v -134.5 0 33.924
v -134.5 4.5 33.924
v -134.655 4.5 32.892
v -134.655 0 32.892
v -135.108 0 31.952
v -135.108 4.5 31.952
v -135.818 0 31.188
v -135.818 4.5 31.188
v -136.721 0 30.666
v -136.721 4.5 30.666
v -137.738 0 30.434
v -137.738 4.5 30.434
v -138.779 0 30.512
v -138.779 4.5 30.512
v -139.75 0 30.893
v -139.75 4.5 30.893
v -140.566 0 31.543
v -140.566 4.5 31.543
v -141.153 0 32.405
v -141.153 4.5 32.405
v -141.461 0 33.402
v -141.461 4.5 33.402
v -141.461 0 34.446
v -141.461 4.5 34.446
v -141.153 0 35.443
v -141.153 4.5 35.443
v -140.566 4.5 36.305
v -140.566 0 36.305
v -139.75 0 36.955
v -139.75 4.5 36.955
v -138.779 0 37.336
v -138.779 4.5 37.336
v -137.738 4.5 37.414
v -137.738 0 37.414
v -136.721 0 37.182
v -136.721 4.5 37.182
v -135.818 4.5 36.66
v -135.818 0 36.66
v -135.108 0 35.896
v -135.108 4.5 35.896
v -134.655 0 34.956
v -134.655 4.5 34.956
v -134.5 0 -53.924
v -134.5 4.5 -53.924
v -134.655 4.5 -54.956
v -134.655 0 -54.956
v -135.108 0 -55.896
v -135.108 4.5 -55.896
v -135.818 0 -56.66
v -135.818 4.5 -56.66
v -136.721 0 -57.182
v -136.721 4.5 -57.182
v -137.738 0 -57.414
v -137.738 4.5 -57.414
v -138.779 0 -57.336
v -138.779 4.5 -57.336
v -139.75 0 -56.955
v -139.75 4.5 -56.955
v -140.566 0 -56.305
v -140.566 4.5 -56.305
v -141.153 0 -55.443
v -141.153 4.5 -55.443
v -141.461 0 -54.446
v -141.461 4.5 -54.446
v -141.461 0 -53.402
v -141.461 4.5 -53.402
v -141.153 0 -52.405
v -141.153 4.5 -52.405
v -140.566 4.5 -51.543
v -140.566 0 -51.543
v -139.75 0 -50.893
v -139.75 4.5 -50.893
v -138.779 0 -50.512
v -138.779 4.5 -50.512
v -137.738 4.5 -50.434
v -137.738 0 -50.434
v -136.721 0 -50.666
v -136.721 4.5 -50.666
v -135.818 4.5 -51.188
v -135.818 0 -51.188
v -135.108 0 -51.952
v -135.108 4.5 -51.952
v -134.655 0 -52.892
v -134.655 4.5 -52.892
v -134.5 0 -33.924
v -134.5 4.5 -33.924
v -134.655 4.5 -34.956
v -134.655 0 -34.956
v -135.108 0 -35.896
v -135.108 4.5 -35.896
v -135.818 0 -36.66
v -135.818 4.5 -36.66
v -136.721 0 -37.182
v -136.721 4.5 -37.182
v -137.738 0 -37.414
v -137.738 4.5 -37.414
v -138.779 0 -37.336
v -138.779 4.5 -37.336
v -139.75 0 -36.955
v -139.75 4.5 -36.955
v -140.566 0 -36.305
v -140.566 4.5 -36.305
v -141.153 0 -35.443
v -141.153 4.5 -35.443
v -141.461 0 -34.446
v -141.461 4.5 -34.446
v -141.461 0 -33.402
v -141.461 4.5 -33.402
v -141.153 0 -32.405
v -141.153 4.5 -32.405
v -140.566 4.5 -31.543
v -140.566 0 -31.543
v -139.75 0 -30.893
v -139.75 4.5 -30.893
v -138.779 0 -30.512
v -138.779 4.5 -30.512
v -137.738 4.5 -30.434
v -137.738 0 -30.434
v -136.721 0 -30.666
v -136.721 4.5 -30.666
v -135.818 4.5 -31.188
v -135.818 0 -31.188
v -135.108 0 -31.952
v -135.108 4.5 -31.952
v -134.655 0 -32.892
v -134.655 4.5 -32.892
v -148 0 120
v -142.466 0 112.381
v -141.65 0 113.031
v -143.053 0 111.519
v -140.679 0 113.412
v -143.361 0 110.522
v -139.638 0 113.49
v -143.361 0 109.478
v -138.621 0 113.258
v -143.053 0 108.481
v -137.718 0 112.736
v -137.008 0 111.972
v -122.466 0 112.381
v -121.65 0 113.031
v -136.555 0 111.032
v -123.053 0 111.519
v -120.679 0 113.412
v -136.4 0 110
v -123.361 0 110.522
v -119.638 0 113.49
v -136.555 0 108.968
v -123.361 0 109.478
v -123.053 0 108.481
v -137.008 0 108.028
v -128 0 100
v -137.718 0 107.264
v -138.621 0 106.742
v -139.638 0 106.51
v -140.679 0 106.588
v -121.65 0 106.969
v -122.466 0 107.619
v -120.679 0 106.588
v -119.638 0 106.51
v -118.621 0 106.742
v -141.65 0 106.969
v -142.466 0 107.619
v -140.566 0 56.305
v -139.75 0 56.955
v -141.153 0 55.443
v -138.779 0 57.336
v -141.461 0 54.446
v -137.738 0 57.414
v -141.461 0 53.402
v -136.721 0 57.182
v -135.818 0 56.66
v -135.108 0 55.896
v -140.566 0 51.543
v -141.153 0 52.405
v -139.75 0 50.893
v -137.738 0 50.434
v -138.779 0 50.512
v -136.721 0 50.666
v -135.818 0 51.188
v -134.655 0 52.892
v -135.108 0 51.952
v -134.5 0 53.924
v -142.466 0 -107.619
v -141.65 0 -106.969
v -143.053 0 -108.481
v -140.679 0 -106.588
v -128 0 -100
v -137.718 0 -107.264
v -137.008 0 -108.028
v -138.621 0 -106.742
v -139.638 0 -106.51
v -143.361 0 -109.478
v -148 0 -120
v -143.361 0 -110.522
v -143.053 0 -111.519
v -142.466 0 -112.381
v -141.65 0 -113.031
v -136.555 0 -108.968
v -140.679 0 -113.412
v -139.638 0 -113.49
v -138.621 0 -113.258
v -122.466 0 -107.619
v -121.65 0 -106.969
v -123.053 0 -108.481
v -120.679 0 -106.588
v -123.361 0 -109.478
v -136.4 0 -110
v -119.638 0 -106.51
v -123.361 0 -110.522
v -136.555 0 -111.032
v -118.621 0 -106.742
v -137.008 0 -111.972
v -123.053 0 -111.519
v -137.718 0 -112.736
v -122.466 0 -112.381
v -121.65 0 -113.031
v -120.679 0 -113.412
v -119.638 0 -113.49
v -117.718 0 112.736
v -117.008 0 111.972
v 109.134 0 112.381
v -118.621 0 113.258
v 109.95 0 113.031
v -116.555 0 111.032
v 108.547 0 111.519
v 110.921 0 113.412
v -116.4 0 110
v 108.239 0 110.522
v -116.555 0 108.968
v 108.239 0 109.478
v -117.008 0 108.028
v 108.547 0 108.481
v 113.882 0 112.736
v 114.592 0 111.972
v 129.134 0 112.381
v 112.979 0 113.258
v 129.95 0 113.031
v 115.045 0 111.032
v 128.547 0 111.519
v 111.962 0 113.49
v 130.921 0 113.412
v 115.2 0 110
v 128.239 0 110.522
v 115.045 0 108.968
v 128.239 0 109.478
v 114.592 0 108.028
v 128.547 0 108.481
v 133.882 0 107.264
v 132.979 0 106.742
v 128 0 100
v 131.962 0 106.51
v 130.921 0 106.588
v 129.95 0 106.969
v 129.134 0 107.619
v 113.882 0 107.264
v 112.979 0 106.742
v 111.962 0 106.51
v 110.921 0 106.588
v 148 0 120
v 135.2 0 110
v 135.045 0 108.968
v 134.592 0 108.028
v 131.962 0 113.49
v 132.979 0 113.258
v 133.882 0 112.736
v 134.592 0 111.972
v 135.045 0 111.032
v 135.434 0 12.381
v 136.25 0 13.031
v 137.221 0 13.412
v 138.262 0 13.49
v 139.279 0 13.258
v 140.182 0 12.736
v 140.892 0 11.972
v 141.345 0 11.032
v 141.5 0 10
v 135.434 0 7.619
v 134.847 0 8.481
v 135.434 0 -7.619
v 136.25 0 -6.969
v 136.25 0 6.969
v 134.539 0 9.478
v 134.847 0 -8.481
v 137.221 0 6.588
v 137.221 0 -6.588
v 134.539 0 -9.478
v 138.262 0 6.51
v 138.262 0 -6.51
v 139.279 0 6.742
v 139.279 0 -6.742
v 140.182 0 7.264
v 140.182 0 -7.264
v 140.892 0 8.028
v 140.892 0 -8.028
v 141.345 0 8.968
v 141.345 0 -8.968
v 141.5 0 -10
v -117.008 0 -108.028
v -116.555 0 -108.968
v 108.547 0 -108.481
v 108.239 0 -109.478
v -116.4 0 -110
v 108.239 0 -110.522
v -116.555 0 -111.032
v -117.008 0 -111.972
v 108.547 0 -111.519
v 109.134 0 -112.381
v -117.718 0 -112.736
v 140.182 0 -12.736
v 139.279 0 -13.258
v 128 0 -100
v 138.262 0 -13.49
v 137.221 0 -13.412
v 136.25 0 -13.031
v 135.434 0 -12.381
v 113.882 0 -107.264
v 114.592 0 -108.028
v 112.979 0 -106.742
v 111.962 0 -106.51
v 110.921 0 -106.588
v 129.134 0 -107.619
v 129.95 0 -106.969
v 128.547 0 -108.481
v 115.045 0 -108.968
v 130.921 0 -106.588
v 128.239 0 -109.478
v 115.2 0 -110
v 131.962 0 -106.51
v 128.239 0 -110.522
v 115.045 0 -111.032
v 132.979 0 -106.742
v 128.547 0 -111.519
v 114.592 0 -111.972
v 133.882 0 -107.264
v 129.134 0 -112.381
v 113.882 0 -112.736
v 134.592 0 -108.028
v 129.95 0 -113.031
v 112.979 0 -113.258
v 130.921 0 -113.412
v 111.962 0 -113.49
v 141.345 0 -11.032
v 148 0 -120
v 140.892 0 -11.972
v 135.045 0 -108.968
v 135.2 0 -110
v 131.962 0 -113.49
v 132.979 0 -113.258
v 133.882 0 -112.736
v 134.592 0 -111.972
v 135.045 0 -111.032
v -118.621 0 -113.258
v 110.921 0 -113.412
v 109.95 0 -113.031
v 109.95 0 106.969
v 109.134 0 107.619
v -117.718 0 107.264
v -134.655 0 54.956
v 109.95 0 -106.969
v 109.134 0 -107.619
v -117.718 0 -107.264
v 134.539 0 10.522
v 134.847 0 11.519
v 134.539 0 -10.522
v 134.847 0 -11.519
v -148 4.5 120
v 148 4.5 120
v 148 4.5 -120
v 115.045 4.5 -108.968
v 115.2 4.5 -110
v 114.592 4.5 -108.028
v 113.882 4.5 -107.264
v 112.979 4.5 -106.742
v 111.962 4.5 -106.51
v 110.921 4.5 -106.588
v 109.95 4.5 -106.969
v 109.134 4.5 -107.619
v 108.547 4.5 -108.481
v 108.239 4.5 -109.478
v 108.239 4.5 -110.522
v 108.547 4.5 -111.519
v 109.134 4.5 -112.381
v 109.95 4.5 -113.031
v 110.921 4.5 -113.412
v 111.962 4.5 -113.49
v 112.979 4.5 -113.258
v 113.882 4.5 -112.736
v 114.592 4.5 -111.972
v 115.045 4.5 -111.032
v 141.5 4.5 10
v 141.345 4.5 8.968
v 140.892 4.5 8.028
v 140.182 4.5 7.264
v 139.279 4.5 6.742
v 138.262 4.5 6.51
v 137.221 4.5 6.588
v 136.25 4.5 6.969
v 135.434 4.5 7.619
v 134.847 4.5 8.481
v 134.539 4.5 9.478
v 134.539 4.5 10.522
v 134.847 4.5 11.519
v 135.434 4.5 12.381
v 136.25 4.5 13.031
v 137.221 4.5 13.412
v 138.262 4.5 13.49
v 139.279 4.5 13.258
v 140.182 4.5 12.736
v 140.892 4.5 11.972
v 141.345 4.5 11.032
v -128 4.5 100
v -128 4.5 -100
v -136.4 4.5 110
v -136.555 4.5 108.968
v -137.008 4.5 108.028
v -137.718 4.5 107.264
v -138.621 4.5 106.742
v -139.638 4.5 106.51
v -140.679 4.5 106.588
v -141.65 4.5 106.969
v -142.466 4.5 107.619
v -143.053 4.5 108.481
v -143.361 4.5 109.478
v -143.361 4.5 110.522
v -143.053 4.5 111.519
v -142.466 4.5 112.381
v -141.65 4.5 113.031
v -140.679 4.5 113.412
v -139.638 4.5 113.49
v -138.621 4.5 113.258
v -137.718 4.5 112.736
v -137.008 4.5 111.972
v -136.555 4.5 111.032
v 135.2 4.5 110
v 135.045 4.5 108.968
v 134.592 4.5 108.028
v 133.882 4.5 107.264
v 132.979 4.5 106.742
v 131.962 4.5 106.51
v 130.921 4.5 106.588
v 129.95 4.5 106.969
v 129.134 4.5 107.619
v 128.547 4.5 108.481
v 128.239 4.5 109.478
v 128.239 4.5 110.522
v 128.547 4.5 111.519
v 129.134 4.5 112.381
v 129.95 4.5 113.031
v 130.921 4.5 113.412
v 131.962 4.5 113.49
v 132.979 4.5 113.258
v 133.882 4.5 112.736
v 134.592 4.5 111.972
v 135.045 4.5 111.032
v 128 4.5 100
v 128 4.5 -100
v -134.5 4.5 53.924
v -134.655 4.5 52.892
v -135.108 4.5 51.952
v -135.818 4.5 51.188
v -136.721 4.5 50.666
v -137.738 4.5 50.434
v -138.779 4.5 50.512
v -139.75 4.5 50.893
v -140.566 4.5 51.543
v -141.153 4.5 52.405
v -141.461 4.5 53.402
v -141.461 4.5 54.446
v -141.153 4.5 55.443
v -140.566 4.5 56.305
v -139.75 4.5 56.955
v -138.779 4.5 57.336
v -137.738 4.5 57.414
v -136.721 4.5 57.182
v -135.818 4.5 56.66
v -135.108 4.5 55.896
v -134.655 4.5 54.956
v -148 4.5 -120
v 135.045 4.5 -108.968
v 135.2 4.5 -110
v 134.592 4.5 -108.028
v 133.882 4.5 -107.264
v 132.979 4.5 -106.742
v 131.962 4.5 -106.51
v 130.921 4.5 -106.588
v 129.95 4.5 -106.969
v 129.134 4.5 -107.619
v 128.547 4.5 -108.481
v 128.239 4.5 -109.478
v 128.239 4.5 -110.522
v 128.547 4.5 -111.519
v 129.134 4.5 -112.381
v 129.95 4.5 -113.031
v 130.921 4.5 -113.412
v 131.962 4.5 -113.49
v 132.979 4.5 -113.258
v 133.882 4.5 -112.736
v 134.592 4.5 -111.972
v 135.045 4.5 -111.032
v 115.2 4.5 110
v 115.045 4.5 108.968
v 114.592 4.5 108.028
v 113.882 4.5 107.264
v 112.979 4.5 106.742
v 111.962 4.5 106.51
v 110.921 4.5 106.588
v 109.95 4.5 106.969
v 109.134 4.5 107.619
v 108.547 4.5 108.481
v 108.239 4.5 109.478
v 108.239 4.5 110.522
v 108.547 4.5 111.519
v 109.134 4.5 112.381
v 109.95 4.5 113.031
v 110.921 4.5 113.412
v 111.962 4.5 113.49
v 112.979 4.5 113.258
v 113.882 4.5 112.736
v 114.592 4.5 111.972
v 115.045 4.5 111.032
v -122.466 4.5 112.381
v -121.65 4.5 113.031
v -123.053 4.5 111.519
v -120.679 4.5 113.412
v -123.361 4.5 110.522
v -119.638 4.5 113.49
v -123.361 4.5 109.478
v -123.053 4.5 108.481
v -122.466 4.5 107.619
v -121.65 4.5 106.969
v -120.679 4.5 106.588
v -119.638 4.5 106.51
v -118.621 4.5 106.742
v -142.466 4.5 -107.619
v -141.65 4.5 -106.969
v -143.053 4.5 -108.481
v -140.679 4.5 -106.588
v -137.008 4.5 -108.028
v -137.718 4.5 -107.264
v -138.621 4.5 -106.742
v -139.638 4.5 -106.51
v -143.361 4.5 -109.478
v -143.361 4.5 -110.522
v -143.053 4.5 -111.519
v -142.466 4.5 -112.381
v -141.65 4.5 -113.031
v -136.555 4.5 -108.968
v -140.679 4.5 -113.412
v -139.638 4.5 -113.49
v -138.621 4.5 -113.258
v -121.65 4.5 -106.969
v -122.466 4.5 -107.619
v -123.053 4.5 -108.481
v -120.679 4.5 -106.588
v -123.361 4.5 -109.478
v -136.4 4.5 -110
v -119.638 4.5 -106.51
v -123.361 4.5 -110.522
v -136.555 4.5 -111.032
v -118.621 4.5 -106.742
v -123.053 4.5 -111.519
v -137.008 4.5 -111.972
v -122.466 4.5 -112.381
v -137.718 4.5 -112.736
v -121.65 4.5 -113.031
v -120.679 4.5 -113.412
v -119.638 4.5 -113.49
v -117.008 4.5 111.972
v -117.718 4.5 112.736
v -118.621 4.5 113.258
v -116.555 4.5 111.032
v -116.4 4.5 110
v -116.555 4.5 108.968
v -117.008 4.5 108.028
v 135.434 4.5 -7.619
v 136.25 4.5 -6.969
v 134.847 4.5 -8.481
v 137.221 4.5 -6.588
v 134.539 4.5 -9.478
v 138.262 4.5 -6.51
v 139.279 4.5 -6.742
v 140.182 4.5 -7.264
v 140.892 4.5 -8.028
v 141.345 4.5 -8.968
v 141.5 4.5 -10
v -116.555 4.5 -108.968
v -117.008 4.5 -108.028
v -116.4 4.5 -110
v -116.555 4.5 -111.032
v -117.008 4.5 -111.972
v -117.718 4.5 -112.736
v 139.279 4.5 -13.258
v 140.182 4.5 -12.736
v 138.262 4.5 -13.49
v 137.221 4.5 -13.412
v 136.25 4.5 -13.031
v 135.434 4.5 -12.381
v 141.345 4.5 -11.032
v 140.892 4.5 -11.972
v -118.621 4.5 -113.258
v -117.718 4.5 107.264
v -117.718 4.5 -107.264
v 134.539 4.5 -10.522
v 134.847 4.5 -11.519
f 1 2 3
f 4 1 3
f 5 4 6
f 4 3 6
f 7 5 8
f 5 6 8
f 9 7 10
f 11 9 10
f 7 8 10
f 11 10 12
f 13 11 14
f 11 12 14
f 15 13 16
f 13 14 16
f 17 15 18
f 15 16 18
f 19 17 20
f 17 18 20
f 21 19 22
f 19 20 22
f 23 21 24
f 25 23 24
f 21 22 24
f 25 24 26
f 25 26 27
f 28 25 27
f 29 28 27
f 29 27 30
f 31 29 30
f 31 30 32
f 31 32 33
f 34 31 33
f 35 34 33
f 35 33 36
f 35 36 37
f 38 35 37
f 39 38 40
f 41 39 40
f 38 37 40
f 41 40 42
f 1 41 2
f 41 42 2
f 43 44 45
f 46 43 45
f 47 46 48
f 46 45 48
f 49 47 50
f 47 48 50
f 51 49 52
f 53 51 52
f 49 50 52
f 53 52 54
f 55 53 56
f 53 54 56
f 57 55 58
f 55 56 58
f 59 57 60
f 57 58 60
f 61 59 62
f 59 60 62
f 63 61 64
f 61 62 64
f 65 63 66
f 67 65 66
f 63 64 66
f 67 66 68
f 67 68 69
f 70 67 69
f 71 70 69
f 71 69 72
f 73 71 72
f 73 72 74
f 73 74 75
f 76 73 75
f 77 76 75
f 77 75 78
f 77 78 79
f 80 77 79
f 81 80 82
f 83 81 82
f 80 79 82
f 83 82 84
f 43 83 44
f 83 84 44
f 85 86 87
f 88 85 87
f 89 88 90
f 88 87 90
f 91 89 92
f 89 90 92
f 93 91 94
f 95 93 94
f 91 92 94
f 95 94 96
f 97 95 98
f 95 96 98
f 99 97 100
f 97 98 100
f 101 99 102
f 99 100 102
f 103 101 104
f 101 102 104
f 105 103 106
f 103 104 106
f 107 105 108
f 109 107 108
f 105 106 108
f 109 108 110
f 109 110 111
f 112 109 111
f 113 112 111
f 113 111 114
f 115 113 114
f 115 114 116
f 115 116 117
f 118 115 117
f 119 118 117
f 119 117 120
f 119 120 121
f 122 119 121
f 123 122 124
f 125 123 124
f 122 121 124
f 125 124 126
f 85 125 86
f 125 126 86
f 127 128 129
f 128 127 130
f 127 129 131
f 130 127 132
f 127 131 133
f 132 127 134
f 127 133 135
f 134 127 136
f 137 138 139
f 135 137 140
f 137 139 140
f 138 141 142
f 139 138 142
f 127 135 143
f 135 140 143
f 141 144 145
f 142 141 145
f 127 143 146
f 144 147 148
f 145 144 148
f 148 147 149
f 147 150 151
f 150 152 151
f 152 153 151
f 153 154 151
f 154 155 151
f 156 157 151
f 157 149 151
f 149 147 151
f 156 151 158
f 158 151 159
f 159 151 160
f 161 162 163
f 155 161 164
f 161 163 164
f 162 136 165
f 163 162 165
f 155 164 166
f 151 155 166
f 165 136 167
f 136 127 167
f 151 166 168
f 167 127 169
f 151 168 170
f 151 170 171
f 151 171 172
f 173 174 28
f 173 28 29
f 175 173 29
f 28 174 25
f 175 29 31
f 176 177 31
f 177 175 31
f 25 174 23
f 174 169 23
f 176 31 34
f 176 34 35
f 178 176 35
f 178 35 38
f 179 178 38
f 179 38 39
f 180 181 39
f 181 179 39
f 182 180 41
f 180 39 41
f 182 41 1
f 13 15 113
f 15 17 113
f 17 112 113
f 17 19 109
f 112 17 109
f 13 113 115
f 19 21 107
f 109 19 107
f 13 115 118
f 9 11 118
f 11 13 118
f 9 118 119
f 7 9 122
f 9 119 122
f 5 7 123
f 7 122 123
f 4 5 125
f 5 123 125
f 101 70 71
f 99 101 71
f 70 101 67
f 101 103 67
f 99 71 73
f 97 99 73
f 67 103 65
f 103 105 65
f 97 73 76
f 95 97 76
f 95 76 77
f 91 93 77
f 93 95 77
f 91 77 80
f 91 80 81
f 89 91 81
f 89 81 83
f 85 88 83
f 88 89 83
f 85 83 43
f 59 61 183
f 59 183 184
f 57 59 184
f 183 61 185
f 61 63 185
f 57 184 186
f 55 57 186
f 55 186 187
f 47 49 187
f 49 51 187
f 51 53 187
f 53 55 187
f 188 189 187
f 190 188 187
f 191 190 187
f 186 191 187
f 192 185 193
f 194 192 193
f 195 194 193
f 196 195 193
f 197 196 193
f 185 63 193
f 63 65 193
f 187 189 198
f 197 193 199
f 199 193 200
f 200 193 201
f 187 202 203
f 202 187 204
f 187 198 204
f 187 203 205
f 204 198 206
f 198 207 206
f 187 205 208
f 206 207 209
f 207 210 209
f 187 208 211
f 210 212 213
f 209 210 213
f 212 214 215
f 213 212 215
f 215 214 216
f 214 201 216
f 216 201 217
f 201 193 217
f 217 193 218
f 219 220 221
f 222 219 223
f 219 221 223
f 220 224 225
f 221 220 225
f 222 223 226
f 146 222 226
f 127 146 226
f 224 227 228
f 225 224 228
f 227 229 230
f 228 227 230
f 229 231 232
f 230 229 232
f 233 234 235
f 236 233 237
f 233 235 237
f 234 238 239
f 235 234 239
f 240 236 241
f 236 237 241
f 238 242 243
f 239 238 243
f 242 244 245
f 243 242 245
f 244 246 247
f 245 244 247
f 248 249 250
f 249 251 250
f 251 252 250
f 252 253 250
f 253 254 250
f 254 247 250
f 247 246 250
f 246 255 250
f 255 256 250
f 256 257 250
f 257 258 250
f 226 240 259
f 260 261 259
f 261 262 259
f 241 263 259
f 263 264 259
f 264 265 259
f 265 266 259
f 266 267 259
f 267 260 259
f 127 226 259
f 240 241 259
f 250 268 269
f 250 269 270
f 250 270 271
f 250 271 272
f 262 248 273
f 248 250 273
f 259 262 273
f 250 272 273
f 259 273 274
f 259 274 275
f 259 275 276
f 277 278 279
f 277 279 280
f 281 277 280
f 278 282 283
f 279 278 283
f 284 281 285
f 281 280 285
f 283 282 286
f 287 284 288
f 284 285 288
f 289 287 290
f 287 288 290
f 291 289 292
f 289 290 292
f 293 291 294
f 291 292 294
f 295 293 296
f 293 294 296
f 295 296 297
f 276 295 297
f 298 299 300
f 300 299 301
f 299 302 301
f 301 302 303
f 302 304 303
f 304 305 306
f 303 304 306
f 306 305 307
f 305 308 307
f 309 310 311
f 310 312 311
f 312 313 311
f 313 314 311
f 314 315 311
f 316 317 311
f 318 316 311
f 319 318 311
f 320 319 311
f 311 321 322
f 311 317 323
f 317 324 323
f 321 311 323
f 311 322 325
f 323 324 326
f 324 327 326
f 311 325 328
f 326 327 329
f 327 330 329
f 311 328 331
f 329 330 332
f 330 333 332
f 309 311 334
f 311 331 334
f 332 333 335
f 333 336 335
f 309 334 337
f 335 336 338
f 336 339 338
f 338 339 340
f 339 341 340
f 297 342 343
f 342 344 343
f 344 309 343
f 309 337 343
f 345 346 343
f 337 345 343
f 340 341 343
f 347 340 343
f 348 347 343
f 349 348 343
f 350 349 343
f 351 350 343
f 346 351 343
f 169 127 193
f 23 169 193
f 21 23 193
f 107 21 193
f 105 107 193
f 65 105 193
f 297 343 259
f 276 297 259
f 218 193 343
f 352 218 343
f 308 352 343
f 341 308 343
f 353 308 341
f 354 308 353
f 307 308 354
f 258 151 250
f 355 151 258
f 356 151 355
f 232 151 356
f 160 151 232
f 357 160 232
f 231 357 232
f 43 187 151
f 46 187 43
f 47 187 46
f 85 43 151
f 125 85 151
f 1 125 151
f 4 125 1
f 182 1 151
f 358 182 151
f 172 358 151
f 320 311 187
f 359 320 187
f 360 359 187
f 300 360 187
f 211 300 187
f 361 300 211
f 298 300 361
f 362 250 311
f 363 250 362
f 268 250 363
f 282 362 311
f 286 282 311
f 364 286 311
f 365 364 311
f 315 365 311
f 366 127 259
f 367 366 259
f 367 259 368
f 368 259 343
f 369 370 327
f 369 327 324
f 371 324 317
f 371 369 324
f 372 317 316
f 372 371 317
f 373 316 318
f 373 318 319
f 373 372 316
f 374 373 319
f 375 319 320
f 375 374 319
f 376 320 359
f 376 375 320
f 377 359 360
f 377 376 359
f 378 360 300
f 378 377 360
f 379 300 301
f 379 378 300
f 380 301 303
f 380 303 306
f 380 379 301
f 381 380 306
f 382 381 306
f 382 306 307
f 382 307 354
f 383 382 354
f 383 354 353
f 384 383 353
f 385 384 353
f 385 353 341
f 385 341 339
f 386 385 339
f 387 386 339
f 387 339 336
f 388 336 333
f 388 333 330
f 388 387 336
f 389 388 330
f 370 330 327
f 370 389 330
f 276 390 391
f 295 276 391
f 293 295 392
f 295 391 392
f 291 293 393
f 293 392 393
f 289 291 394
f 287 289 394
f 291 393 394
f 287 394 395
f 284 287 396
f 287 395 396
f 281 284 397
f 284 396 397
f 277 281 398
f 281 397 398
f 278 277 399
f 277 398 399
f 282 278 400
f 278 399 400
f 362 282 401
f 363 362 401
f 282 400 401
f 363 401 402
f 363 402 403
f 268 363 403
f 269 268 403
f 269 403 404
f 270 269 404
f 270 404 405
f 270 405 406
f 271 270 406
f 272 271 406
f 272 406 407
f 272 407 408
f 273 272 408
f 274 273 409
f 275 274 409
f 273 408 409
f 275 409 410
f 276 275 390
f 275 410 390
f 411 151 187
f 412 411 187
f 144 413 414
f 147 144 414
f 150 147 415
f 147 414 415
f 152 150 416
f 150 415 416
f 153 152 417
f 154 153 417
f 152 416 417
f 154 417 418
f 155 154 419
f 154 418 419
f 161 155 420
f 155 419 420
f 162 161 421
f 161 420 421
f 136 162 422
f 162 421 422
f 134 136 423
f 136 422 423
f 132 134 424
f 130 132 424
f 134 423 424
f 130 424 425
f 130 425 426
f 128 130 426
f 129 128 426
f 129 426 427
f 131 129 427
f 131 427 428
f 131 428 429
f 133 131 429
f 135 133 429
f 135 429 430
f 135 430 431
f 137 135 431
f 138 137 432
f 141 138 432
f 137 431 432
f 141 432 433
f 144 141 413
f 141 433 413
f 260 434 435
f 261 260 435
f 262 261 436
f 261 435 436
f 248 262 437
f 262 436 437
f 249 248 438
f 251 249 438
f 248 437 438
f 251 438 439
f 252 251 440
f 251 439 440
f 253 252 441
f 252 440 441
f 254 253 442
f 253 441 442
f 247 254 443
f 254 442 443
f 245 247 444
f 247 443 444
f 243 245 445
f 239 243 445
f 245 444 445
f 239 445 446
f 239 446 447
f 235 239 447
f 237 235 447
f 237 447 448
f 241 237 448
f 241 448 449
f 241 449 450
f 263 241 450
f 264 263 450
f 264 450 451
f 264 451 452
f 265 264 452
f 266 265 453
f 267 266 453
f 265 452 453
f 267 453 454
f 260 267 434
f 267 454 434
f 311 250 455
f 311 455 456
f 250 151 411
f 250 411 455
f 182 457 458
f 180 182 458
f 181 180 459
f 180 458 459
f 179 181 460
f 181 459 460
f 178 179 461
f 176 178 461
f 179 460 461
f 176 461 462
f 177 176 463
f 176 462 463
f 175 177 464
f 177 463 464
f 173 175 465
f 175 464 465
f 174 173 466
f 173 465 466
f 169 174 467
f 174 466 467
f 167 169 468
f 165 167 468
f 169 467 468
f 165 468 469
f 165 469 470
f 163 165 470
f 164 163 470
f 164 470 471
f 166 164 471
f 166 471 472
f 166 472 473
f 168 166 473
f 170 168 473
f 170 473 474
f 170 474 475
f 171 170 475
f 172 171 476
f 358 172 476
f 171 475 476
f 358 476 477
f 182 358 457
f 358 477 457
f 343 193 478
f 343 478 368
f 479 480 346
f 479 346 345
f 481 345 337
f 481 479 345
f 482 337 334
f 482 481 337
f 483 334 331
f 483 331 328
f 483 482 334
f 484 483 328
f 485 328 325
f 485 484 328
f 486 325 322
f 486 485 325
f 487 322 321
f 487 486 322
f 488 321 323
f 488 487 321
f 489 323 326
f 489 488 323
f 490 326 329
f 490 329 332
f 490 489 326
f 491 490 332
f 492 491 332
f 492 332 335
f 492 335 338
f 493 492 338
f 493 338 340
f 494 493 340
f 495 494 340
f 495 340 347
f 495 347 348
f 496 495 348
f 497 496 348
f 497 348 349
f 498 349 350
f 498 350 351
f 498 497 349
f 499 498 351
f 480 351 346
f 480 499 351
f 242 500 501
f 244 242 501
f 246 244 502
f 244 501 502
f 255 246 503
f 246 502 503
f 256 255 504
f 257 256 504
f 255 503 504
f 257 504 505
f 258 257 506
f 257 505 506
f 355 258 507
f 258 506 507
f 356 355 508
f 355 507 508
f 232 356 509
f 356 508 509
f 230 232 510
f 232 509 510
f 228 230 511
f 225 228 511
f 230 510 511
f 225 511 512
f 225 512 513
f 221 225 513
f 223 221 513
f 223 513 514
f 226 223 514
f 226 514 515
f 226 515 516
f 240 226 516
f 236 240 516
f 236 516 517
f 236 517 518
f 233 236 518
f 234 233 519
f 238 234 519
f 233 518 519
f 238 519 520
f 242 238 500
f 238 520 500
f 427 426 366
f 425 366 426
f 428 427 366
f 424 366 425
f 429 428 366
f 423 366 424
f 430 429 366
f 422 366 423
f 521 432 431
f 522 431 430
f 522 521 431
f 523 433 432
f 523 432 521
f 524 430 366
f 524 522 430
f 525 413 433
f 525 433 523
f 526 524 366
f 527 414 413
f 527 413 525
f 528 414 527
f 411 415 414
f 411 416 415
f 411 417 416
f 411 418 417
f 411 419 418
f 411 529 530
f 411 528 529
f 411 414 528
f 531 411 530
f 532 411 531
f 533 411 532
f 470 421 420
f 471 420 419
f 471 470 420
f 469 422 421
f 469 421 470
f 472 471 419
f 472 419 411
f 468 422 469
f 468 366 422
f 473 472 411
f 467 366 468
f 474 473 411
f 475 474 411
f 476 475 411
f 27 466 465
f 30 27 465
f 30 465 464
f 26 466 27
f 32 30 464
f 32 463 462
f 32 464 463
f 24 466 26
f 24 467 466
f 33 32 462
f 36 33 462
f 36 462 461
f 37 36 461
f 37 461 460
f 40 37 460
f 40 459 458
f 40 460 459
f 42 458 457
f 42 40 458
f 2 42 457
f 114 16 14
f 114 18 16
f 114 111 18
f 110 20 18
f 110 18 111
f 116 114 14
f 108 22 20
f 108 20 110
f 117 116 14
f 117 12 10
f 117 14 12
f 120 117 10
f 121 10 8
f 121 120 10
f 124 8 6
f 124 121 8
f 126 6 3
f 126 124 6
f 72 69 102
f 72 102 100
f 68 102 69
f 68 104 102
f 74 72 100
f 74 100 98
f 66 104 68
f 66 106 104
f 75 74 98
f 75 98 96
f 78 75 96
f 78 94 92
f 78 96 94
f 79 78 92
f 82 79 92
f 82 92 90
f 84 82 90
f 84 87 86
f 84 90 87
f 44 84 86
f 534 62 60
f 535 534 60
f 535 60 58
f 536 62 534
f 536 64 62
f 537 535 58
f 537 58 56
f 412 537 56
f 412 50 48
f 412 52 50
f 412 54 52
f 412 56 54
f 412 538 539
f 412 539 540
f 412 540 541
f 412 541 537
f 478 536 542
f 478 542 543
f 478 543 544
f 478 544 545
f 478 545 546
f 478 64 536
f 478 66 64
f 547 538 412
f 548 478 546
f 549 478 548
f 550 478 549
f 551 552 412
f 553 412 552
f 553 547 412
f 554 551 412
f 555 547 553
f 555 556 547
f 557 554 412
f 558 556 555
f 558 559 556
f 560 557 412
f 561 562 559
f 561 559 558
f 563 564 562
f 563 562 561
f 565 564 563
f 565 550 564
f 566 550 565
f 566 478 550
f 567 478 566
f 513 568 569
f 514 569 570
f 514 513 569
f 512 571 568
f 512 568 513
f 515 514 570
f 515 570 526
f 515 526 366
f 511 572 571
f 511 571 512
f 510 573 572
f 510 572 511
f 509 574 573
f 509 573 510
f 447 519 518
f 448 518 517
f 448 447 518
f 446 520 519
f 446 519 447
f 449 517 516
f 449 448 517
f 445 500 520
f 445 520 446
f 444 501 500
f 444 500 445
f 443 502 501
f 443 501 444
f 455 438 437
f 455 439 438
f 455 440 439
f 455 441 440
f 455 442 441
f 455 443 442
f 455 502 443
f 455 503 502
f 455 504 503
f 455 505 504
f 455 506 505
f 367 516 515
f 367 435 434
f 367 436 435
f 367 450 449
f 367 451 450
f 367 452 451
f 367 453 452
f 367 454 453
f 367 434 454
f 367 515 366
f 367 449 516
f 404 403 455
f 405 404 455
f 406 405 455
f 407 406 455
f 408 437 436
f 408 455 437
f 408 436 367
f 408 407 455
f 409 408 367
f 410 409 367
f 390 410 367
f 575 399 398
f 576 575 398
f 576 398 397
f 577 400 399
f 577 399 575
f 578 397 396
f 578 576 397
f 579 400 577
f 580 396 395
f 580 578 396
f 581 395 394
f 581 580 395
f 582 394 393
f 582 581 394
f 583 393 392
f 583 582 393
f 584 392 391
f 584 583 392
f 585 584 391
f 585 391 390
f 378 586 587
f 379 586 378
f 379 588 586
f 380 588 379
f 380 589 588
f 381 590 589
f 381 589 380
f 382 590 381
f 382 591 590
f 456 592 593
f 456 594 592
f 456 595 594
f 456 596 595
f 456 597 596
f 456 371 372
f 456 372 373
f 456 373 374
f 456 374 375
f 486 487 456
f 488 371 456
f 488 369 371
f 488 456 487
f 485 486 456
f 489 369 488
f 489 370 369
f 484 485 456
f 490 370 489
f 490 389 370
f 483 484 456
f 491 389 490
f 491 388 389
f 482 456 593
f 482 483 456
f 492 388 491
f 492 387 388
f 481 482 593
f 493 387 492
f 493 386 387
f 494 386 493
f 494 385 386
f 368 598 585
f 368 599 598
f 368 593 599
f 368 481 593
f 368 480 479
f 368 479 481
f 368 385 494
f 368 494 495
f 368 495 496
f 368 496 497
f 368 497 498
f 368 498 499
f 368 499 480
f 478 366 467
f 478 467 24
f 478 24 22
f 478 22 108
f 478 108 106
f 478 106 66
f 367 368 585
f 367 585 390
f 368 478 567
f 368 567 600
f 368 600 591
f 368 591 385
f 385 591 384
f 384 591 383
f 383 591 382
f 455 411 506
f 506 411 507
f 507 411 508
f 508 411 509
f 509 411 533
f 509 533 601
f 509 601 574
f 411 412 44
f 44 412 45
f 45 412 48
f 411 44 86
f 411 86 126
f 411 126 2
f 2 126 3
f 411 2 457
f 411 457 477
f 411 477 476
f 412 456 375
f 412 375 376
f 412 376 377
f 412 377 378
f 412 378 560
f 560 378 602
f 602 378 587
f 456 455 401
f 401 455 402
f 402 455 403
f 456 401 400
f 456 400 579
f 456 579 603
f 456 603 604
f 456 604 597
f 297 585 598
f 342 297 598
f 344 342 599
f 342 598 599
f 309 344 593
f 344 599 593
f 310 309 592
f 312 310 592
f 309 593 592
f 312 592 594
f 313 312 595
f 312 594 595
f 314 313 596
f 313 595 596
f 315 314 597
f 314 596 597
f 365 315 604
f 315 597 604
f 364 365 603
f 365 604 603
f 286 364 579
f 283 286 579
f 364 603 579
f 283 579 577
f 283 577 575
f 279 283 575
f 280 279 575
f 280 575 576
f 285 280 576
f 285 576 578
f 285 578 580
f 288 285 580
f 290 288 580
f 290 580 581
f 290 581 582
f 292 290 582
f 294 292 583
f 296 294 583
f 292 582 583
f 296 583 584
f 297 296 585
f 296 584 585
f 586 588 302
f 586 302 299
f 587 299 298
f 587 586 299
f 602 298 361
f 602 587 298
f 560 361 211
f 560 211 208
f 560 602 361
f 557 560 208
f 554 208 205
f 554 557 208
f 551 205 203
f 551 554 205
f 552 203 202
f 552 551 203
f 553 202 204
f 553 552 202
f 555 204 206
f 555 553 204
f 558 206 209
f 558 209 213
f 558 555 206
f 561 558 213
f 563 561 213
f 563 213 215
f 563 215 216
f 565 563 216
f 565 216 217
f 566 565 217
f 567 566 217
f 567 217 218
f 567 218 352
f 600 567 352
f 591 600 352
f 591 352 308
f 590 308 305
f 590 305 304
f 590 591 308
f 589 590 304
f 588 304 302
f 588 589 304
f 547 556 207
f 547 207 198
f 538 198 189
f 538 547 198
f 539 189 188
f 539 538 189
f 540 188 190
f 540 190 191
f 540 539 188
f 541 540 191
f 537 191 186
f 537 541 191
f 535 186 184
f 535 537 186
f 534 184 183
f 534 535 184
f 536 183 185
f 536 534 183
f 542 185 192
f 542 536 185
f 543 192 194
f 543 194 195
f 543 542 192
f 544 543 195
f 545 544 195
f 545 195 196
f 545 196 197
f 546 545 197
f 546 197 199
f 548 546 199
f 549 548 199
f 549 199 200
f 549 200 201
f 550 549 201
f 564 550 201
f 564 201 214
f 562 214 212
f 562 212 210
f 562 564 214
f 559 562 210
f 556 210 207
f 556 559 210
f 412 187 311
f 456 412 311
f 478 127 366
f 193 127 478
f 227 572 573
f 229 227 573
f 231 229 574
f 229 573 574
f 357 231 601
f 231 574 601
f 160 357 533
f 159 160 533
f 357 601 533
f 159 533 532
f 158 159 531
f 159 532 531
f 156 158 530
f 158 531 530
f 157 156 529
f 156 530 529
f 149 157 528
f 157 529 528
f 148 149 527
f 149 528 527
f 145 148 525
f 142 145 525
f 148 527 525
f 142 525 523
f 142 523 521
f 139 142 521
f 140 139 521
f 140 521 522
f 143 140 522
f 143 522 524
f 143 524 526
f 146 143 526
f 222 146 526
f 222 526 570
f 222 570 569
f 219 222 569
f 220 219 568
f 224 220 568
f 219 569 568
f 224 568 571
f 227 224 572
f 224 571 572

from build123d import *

# Parameters (mm, degrees)
SKETCH1_W           = 296
SKETCH1_H           = 240
SKETCH1_W_2         = 256
SKETCH1_H_2         = 200
BOSS_EXTRUDE1_DEPTH = 4.5
SKETCH2_R           = 3.5
CUT_EXTRUDE1_DEPTH  = 4.5
SKETCH3_R           = 3.5
CUT_EXTRUDE2_DEPTH  = 4.5
SKETCH4_R           = 3.5
CUT_EXTRUDE3_DEPTH  = 4.5
SKETCH5_R           = 3.5
CUT_EXTRUDE4_DEPTH  = 4.5


with BuildPart() as part:
    # Sketch1 → Boss-Extrude1 (new body)
    with BuildSketch(Plane(origin=(0, 0, 0), x_dir=(1, 0, 0), z_dir=(0, 1, 0))):
        Rectangle(SKETCH1_W, SKETCH1_H)
        Rectangle(SKETCH1_W_2, SKETCH1_H_2, mode=Mode.SUBTRACT)
    extrude(amount=BOSS_EXTRUDE1_DEPTH)

    # Sketch2 → Cut-Extrude1 (cut)
    with BuildSketch(Plane(origin=(0, 4.5, 0), x_dir=(1, 0, 0), z_dir=(0, 1, 0))):
        with Locations((-139.9, -110)):
            Circle(SKETCH2_R)
        with Locations((-119.9, -110)):
            Circle(SKETCH2_R)
    cut_extrude1 = extrude(amount=-CUT_EXTRUDE1_DEPTH, mode=Mode.SUBTRACT)

    # Mirror1: Cut-Extrude1 across plane
    add(cut_extrude1.mirror(Plane.XY), mode=Mode.SUBTRACT)

    # Sketch3 → Cut-Extrude2 (cut)
    with BuildSketch(Plane(origin=(0, 4.5, 0), x_dir=(1, 0, 0), z_dir=(0, 1, 0))):
        with Locations((131.7, -110)):
            Circle(SKETCH3_R)
        with Locations((111.7, -110)):
            Circle(SKETCH3_R)
    cut_extrude2 = extrude(amount=-CUT_EXTRUDE2_DEPTH, mode=Mode.SUBTRACT)

    # Mirror2: Cut-Extrude2 across plane
    add(cut_extrude2.mirror(Plane.XY), mode=Mode.SUBTRACT)

    # Sketch4 → Cut-Extrude3 (cut)
    with BuildSketch(Plane(origin=(0, 4.5, 0), x_dir=(1, 0, 0), z_dir=(0, 1, 0))):
        with Locations((138, 10)):
            Circle(SKETCH4_R)
        with Locations((138, -10)):
            Circle(SKETCH4_R)
    extrude(amount=-CUT_EXTRUDE3_DEPTH, mode=Mode.SUBTRACT)

    # Sketch5 → Cut-Extrude4 (cut)
    with BuildSketch(Plane(origin=(0, 4.5, 0), x_dir=(1, 0, 0), z_dir=(0, 1, 0))):
        with Locations((-138, 53.924043482)):
            Circle(SKETCH5_R)
        with Locations((-138, 33.924043482)):
            Circle(SKETCH5_R)
        with Locations((-138, -33.924043482)):
            Circle(SKETCH5_R)
        with Locations((-138, -53.924043482)):
            Circle(SKETCH5_R)
    extrude(amount=-CUT_EXTRUDE4_DEPTH, mode=Mode.SUBTRACT)


solid = part.part
